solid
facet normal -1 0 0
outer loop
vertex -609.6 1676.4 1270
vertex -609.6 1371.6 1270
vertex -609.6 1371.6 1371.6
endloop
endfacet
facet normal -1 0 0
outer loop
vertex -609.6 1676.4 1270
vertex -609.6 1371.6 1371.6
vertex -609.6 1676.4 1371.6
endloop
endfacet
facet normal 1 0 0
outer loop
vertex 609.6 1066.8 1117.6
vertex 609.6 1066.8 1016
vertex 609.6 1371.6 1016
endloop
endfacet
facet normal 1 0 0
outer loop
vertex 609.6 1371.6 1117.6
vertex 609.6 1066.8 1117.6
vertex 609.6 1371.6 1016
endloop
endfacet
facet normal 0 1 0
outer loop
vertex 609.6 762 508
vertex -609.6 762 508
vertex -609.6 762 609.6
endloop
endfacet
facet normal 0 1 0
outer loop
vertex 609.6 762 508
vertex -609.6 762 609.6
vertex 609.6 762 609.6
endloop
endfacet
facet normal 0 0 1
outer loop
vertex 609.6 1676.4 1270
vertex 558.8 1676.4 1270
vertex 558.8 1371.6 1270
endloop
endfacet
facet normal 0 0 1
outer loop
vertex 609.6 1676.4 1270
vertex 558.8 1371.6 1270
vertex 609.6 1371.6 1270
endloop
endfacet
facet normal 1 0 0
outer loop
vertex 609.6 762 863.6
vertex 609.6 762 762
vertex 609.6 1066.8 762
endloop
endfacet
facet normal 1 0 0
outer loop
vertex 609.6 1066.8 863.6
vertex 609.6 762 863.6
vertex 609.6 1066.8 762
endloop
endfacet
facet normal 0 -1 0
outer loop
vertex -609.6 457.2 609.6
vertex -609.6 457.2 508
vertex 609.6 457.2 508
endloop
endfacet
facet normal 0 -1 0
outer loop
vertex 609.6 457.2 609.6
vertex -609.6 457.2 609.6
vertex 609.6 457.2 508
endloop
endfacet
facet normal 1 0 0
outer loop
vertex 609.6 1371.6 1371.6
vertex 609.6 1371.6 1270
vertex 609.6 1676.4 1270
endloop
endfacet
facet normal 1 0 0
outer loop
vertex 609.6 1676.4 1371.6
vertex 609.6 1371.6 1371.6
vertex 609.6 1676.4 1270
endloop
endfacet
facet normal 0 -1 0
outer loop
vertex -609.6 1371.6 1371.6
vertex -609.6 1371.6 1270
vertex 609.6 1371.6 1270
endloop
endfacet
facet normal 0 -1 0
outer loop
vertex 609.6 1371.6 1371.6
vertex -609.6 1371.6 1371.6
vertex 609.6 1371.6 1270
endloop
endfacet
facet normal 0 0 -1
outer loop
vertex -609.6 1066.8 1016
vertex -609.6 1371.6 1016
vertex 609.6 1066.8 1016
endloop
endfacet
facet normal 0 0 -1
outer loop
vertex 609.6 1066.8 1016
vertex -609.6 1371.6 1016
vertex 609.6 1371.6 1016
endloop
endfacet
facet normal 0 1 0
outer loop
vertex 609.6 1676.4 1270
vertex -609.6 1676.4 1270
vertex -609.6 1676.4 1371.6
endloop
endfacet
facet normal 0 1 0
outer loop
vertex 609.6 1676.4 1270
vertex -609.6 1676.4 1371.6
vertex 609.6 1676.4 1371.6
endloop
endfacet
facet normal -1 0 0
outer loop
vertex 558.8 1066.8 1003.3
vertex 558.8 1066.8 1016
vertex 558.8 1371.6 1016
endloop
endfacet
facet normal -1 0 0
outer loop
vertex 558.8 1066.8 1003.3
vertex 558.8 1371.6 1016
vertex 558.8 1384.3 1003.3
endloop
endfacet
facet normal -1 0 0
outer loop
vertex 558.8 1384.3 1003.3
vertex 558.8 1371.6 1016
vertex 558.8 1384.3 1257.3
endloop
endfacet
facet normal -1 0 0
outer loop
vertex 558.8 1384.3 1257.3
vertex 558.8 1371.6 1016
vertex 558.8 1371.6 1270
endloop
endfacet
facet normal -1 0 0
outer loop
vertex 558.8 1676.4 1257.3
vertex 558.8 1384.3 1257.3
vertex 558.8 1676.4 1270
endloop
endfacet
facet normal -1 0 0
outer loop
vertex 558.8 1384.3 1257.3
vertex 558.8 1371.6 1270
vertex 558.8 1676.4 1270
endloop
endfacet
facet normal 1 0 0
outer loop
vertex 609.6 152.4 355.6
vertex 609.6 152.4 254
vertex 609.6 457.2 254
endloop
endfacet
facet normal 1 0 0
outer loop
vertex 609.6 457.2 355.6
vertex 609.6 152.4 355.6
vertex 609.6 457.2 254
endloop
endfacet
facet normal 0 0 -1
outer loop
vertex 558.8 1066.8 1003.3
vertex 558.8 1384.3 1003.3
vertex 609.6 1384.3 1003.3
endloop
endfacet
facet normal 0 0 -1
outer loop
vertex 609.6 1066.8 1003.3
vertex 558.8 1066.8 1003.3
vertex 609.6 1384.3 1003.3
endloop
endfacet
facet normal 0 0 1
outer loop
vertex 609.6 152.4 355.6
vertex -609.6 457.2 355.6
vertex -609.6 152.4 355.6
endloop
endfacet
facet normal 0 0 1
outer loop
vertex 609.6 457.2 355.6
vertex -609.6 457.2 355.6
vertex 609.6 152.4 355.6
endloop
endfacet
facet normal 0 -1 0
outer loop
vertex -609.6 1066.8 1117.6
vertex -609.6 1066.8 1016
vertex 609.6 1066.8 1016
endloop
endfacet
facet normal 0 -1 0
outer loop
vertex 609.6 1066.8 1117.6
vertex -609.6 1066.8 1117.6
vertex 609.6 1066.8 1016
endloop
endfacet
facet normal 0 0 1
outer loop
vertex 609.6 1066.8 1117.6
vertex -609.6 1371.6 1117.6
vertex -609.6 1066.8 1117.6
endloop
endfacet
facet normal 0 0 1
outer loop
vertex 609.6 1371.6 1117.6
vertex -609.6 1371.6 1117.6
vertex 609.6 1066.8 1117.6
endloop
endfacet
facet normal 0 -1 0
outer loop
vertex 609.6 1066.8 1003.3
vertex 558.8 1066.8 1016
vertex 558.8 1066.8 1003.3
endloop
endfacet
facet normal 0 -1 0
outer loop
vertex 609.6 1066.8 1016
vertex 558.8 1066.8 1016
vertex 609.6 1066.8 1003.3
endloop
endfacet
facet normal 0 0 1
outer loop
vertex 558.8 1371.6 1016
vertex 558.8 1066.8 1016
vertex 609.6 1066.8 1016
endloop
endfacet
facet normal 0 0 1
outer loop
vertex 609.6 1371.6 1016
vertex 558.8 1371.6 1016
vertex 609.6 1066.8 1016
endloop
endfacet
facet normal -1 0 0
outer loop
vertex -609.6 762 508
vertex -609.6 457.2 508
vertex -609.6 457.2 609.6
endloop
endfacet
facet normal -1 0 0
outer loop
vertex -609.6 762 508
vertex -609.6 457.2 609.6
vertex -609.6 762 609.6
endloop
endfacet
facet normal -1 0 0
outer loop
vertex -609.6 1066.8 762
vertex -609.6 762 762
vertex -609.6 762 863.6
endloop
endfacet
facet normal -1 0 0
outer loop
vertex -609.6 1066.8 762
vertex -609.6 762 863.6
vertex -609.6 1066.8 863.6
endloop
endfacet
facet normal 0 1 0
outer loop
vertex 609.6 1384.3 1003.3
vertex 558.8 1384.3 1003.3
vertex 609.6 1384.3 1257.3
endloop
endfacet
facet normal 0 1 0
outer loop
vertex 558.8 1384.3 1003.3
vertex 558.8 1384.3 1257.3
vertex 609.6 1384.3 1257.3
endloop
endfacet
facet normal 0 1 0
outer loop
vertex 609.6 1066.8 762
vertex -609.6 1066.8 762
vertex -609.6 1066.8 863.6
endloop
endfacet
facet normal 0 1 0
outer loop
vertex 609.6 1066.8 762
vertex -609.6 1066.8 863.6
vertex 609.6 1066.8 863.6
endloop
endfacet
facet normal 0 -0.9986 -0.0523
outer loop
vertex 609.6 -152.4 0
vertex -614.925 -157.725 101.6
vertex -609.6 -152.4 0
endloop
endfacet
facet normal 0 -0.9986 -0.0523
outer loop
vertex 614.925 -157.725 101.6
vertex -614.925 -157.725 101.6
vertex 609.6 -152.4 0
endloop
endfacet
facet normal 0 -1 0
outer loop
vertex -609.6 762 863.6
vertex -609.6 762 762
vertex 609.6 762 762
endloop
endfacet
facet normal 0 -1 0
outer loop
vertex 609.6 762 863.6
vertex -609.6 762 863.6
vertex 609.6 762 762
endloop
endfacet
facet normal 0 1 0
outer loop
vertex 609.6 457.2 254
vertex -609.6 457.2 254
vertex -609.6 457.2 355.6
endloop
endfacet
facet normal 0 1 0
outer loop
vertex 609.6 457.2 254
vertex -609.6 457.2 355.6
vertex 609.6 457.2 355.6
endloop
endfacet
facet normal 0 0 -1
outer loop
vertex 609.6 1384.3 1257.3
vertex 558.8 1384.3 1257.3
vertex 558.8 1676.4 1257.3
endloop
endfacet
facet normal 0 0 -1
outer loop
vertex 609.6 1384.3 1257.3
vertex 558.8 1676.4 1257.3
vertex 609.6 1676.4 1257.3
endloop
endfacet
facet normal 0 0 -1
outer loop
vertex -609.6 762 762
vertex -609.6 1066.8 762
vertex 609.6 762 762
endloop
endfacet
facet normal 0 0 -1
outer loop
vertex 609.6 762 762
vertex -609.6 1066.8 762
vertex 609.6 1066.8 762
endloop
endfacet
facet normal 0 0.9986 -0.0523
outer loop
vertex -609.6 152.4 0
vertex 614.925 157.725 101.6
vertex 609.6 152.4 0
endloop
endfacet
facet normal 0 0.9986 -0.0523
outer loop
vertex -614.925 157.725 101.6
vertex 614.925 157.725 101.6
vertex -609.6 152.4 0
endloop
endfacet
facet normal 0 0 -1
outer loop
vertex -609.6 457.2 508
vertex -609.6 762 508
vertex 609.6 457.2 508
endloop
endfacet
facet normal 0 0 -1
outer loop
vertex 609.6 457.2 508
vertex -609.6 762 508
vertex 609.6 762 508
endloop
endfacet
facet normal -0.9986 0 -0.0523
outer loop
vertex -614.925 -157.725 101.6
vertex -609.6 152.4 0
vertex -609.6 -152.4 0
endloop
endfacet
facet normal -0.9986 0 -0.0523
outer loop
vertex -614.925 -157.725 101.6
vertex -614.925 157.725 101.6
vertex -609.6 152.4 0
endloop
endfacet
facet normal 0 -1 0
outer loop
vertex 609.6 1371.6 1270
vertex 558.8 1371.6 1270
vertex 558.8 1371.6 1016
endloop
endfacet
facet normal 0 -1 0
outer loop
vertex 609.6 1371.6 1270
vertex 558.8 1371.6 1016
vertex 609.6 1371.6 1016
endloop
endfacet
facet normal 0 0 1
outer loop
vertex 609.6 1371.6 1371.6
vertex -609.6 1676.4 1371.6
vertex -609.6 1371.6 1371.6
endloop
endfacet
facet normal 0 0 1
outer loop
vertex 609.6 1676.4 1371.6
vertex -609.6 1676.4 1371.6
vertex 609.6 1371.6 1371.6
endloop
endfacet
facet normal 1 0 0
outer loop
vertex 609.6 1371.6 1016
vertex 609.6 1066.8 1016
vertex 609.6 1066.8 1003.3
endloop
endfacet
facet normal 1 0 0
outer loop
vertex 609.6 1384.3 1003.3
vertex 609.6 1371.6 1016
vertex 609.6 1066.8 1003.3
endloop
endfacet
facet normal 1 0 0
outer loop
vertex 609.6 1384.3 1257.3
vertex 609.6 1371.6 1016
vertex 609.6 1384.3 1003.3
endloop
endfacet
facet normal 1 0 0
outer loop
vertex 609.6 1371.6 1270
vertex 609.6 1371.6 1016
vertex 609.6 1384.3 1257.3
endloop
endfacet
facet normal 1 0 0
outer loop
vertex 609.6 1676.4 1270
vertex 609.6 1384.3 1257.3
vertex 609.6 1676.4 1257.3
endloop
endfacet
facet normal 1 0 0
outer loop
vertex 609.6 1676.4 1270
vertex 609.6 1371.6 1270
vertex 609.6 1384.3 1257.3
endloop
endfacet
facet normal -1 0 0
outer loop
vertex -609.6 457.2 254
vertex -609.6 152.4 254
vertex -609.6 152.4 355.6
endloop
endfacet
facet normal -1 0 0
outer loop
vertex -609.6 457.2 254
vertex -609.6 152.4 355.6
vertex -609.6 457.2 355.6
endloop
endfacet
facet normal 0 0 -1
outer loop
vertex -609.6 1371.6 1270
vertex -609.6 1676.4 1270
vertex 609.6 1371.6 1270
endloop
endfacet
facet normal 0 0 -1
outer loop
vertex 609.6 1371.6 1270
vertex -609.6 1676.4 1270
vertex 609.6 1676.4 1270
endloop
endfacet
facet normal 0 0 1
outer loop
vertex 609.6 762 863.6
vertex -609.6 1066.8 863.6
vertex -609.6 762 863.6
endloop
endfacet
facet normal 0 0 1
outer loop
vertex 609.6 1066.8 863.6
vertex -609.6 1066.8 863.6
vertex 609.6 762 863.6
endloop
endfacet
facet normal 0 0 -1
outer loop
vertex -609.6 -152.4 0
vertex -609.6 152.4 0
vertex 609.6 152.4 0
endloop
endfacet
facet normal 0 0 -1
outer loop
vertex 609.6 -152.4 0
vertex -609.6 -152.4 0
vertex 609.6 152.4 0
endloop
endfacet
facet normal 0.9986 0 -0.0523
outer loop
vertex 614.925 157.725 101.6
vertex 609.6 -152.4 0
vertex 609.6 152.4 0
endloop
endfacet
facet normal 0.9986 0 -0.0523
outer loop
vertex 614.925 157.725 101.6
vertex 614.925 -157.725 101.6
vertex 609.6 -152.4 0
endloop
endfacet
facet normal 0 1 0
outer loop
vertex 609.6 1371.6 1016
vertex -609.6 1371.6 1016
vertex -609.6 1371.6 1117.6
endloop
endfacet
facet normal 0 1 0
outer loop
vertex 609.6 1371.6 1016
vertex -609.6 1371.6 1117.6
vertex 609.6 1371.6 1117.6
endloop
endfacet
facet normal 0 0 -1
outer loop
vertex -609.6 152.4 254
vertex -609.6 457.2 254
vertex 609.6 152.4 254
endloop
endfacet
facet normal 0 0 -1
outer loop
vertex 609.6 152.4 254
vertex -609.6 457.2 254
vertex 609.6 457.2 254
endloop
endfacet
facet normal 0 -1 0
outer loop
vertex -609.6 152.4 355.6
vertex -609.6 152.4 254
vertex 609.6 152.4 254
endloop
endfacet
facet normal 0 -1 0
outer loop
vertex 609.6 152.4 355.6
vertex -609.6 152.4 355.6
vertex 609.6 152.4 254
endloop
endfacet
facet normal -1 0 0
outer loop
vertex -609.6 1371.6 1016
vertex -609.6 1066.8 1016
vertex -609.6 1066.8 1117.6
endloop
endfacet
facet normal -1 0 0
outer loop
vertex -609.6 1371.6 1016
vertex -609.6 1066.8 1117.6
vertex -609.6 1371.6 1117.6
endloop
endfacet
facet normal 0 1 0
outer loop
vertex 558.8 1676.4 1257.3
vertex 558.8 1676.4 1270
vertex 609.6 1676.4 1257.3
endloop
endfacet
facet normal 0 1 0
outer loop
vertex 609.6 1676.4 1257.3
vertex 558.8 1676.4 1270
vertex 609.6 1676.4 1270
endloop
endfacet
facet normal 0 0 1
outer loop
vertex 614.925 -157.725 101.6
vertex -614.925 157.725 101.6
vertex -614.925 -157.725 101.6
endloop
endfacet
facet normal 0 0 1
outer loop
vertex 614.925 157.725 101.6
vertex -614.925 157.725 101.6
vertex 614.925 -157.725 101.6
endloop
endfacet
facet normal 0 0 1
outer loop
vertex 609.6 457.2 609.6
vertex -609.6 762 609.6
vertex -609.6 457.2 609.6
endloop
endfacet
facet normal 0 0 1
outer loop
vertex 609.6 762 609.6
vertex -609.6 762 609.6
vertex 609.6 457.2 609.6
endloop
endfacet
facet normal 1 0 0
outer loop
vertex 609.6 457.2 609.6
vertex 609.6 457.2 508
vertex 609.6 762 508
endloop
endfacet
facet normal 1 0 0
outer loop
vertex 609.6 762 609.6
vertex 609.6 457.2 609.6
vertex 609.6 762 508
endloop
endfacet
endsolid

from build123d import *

# Parameters (mm, degrees)
F0_W      = 1219.2
F0_H      = 304.8
F1_DEPTH  = 101.6
F1_TAPER  = -3
F3_W      = 1219.2
F3_H      = 304.8
F4_DEPTH  = 101.6
F6_W      = 1219.2
F6_H      = 304.8
F7_DEPTH  = 101.6
F9_W      = 1219.2
F9_H      = 304.8
F10_DEPTH = 101.6
F12_W     = 1219.2
F12_H     = 304.8
F13_DEPTH = 101.6
F15_W     = 1219.2
F15_H     = 304.8
F16_DEPTH = 101.6
F18_W     = 50.8
F18_H     = 241.3
F19_DEPTH = 12.7
F20_W     = 50.8
F20_H     = 304.8
F21_DEPTH = 12.7
F22_W     = 50.8
F22_H     = 317.5
F23_DEPTH = 12.7


with BuildPart() as f1:
    # F0 (on Top) → F1 (new body)
    with BuildSketch(Plane.XY):
        Rectangle(F0_W, F0_H)
    extrude(amount=F1_DEPTH, taper=F1_TAPER)


with BuildPart() as f4:
    # F3 (on offset) → F4 (new body)
    with BuildSketch(Plane.XY.offset(254)):
        with Locations((0, 304.8)):
            Rectangle(F3_W, F3_H)
    extrude(amount=F4_DEPTH)


with BuildPart() as f7:
    # F6 (on offset) → F7 (new body)
    with BuildSketch(Plane.XY.offset(508)):
        with Locations((0, 609.6)):
            Rectangle(F6_W, F6_H)
    extrude(amount=F7_DEPTH)


with BuildPart() as f10:
    # F9 (on offset) → F10 (new body)
    with BuildSketch(Plane.XY.offset(762)):
        with Locations((0, 914.4)):
            Rectangle(F9_W, F9_H)
    extrude(amount=F10_DEPTH)


with BuildPart() as f13:
    # F12 (on offset) → F13 (new body)
    with BuildSketch(Plane.XY.offset(1016)):
        with Locations((0, 1219.2)):
            Rectangle(F12_W, F12_H)
    extrude(amount=F13_DEPTH)


with BuildPart() as f16:
    # F15 (on offset) → F16 (new body)
    with BuildSketch(Plane.XY.offset(1270)):
        with Locations((0, 1524)):
            Rectangle(F15_W, F15_H)
    extrude(amount=F16_DEPTH)


with BuildPart() as f19:
    # F18 (on offset) → F19 (new body)
    with BuildSketch(Plane.XZ.offset(-1371.6)):
        with Locations((584.2, 1136.65)):
            Rectangle(F18_W, F18_H)
    extrude(amount=-F19_DEPTH)

    # F20 (on offset) → F21 (join)
    with BuildSketch(Plane.XY.offset(1270)):
        with Locations((584.2, 1524)):
            Rectangle(F20_W, F20_H)
    extrude(amount=-F21_DEPTH)

    # F22 (on offset) → F23 (join)
    with BuildSketch(Plane.XY.offset(1016)):
        with Locations((584.2, 1225.55)):
            Rectangle(F22_W, F22_H)
    extrude(amount=-F23_DEPTH)


solid = Compound([f1.part, f4.part, f7.part, f10.part, f13.part, f16.part, f19.part])
